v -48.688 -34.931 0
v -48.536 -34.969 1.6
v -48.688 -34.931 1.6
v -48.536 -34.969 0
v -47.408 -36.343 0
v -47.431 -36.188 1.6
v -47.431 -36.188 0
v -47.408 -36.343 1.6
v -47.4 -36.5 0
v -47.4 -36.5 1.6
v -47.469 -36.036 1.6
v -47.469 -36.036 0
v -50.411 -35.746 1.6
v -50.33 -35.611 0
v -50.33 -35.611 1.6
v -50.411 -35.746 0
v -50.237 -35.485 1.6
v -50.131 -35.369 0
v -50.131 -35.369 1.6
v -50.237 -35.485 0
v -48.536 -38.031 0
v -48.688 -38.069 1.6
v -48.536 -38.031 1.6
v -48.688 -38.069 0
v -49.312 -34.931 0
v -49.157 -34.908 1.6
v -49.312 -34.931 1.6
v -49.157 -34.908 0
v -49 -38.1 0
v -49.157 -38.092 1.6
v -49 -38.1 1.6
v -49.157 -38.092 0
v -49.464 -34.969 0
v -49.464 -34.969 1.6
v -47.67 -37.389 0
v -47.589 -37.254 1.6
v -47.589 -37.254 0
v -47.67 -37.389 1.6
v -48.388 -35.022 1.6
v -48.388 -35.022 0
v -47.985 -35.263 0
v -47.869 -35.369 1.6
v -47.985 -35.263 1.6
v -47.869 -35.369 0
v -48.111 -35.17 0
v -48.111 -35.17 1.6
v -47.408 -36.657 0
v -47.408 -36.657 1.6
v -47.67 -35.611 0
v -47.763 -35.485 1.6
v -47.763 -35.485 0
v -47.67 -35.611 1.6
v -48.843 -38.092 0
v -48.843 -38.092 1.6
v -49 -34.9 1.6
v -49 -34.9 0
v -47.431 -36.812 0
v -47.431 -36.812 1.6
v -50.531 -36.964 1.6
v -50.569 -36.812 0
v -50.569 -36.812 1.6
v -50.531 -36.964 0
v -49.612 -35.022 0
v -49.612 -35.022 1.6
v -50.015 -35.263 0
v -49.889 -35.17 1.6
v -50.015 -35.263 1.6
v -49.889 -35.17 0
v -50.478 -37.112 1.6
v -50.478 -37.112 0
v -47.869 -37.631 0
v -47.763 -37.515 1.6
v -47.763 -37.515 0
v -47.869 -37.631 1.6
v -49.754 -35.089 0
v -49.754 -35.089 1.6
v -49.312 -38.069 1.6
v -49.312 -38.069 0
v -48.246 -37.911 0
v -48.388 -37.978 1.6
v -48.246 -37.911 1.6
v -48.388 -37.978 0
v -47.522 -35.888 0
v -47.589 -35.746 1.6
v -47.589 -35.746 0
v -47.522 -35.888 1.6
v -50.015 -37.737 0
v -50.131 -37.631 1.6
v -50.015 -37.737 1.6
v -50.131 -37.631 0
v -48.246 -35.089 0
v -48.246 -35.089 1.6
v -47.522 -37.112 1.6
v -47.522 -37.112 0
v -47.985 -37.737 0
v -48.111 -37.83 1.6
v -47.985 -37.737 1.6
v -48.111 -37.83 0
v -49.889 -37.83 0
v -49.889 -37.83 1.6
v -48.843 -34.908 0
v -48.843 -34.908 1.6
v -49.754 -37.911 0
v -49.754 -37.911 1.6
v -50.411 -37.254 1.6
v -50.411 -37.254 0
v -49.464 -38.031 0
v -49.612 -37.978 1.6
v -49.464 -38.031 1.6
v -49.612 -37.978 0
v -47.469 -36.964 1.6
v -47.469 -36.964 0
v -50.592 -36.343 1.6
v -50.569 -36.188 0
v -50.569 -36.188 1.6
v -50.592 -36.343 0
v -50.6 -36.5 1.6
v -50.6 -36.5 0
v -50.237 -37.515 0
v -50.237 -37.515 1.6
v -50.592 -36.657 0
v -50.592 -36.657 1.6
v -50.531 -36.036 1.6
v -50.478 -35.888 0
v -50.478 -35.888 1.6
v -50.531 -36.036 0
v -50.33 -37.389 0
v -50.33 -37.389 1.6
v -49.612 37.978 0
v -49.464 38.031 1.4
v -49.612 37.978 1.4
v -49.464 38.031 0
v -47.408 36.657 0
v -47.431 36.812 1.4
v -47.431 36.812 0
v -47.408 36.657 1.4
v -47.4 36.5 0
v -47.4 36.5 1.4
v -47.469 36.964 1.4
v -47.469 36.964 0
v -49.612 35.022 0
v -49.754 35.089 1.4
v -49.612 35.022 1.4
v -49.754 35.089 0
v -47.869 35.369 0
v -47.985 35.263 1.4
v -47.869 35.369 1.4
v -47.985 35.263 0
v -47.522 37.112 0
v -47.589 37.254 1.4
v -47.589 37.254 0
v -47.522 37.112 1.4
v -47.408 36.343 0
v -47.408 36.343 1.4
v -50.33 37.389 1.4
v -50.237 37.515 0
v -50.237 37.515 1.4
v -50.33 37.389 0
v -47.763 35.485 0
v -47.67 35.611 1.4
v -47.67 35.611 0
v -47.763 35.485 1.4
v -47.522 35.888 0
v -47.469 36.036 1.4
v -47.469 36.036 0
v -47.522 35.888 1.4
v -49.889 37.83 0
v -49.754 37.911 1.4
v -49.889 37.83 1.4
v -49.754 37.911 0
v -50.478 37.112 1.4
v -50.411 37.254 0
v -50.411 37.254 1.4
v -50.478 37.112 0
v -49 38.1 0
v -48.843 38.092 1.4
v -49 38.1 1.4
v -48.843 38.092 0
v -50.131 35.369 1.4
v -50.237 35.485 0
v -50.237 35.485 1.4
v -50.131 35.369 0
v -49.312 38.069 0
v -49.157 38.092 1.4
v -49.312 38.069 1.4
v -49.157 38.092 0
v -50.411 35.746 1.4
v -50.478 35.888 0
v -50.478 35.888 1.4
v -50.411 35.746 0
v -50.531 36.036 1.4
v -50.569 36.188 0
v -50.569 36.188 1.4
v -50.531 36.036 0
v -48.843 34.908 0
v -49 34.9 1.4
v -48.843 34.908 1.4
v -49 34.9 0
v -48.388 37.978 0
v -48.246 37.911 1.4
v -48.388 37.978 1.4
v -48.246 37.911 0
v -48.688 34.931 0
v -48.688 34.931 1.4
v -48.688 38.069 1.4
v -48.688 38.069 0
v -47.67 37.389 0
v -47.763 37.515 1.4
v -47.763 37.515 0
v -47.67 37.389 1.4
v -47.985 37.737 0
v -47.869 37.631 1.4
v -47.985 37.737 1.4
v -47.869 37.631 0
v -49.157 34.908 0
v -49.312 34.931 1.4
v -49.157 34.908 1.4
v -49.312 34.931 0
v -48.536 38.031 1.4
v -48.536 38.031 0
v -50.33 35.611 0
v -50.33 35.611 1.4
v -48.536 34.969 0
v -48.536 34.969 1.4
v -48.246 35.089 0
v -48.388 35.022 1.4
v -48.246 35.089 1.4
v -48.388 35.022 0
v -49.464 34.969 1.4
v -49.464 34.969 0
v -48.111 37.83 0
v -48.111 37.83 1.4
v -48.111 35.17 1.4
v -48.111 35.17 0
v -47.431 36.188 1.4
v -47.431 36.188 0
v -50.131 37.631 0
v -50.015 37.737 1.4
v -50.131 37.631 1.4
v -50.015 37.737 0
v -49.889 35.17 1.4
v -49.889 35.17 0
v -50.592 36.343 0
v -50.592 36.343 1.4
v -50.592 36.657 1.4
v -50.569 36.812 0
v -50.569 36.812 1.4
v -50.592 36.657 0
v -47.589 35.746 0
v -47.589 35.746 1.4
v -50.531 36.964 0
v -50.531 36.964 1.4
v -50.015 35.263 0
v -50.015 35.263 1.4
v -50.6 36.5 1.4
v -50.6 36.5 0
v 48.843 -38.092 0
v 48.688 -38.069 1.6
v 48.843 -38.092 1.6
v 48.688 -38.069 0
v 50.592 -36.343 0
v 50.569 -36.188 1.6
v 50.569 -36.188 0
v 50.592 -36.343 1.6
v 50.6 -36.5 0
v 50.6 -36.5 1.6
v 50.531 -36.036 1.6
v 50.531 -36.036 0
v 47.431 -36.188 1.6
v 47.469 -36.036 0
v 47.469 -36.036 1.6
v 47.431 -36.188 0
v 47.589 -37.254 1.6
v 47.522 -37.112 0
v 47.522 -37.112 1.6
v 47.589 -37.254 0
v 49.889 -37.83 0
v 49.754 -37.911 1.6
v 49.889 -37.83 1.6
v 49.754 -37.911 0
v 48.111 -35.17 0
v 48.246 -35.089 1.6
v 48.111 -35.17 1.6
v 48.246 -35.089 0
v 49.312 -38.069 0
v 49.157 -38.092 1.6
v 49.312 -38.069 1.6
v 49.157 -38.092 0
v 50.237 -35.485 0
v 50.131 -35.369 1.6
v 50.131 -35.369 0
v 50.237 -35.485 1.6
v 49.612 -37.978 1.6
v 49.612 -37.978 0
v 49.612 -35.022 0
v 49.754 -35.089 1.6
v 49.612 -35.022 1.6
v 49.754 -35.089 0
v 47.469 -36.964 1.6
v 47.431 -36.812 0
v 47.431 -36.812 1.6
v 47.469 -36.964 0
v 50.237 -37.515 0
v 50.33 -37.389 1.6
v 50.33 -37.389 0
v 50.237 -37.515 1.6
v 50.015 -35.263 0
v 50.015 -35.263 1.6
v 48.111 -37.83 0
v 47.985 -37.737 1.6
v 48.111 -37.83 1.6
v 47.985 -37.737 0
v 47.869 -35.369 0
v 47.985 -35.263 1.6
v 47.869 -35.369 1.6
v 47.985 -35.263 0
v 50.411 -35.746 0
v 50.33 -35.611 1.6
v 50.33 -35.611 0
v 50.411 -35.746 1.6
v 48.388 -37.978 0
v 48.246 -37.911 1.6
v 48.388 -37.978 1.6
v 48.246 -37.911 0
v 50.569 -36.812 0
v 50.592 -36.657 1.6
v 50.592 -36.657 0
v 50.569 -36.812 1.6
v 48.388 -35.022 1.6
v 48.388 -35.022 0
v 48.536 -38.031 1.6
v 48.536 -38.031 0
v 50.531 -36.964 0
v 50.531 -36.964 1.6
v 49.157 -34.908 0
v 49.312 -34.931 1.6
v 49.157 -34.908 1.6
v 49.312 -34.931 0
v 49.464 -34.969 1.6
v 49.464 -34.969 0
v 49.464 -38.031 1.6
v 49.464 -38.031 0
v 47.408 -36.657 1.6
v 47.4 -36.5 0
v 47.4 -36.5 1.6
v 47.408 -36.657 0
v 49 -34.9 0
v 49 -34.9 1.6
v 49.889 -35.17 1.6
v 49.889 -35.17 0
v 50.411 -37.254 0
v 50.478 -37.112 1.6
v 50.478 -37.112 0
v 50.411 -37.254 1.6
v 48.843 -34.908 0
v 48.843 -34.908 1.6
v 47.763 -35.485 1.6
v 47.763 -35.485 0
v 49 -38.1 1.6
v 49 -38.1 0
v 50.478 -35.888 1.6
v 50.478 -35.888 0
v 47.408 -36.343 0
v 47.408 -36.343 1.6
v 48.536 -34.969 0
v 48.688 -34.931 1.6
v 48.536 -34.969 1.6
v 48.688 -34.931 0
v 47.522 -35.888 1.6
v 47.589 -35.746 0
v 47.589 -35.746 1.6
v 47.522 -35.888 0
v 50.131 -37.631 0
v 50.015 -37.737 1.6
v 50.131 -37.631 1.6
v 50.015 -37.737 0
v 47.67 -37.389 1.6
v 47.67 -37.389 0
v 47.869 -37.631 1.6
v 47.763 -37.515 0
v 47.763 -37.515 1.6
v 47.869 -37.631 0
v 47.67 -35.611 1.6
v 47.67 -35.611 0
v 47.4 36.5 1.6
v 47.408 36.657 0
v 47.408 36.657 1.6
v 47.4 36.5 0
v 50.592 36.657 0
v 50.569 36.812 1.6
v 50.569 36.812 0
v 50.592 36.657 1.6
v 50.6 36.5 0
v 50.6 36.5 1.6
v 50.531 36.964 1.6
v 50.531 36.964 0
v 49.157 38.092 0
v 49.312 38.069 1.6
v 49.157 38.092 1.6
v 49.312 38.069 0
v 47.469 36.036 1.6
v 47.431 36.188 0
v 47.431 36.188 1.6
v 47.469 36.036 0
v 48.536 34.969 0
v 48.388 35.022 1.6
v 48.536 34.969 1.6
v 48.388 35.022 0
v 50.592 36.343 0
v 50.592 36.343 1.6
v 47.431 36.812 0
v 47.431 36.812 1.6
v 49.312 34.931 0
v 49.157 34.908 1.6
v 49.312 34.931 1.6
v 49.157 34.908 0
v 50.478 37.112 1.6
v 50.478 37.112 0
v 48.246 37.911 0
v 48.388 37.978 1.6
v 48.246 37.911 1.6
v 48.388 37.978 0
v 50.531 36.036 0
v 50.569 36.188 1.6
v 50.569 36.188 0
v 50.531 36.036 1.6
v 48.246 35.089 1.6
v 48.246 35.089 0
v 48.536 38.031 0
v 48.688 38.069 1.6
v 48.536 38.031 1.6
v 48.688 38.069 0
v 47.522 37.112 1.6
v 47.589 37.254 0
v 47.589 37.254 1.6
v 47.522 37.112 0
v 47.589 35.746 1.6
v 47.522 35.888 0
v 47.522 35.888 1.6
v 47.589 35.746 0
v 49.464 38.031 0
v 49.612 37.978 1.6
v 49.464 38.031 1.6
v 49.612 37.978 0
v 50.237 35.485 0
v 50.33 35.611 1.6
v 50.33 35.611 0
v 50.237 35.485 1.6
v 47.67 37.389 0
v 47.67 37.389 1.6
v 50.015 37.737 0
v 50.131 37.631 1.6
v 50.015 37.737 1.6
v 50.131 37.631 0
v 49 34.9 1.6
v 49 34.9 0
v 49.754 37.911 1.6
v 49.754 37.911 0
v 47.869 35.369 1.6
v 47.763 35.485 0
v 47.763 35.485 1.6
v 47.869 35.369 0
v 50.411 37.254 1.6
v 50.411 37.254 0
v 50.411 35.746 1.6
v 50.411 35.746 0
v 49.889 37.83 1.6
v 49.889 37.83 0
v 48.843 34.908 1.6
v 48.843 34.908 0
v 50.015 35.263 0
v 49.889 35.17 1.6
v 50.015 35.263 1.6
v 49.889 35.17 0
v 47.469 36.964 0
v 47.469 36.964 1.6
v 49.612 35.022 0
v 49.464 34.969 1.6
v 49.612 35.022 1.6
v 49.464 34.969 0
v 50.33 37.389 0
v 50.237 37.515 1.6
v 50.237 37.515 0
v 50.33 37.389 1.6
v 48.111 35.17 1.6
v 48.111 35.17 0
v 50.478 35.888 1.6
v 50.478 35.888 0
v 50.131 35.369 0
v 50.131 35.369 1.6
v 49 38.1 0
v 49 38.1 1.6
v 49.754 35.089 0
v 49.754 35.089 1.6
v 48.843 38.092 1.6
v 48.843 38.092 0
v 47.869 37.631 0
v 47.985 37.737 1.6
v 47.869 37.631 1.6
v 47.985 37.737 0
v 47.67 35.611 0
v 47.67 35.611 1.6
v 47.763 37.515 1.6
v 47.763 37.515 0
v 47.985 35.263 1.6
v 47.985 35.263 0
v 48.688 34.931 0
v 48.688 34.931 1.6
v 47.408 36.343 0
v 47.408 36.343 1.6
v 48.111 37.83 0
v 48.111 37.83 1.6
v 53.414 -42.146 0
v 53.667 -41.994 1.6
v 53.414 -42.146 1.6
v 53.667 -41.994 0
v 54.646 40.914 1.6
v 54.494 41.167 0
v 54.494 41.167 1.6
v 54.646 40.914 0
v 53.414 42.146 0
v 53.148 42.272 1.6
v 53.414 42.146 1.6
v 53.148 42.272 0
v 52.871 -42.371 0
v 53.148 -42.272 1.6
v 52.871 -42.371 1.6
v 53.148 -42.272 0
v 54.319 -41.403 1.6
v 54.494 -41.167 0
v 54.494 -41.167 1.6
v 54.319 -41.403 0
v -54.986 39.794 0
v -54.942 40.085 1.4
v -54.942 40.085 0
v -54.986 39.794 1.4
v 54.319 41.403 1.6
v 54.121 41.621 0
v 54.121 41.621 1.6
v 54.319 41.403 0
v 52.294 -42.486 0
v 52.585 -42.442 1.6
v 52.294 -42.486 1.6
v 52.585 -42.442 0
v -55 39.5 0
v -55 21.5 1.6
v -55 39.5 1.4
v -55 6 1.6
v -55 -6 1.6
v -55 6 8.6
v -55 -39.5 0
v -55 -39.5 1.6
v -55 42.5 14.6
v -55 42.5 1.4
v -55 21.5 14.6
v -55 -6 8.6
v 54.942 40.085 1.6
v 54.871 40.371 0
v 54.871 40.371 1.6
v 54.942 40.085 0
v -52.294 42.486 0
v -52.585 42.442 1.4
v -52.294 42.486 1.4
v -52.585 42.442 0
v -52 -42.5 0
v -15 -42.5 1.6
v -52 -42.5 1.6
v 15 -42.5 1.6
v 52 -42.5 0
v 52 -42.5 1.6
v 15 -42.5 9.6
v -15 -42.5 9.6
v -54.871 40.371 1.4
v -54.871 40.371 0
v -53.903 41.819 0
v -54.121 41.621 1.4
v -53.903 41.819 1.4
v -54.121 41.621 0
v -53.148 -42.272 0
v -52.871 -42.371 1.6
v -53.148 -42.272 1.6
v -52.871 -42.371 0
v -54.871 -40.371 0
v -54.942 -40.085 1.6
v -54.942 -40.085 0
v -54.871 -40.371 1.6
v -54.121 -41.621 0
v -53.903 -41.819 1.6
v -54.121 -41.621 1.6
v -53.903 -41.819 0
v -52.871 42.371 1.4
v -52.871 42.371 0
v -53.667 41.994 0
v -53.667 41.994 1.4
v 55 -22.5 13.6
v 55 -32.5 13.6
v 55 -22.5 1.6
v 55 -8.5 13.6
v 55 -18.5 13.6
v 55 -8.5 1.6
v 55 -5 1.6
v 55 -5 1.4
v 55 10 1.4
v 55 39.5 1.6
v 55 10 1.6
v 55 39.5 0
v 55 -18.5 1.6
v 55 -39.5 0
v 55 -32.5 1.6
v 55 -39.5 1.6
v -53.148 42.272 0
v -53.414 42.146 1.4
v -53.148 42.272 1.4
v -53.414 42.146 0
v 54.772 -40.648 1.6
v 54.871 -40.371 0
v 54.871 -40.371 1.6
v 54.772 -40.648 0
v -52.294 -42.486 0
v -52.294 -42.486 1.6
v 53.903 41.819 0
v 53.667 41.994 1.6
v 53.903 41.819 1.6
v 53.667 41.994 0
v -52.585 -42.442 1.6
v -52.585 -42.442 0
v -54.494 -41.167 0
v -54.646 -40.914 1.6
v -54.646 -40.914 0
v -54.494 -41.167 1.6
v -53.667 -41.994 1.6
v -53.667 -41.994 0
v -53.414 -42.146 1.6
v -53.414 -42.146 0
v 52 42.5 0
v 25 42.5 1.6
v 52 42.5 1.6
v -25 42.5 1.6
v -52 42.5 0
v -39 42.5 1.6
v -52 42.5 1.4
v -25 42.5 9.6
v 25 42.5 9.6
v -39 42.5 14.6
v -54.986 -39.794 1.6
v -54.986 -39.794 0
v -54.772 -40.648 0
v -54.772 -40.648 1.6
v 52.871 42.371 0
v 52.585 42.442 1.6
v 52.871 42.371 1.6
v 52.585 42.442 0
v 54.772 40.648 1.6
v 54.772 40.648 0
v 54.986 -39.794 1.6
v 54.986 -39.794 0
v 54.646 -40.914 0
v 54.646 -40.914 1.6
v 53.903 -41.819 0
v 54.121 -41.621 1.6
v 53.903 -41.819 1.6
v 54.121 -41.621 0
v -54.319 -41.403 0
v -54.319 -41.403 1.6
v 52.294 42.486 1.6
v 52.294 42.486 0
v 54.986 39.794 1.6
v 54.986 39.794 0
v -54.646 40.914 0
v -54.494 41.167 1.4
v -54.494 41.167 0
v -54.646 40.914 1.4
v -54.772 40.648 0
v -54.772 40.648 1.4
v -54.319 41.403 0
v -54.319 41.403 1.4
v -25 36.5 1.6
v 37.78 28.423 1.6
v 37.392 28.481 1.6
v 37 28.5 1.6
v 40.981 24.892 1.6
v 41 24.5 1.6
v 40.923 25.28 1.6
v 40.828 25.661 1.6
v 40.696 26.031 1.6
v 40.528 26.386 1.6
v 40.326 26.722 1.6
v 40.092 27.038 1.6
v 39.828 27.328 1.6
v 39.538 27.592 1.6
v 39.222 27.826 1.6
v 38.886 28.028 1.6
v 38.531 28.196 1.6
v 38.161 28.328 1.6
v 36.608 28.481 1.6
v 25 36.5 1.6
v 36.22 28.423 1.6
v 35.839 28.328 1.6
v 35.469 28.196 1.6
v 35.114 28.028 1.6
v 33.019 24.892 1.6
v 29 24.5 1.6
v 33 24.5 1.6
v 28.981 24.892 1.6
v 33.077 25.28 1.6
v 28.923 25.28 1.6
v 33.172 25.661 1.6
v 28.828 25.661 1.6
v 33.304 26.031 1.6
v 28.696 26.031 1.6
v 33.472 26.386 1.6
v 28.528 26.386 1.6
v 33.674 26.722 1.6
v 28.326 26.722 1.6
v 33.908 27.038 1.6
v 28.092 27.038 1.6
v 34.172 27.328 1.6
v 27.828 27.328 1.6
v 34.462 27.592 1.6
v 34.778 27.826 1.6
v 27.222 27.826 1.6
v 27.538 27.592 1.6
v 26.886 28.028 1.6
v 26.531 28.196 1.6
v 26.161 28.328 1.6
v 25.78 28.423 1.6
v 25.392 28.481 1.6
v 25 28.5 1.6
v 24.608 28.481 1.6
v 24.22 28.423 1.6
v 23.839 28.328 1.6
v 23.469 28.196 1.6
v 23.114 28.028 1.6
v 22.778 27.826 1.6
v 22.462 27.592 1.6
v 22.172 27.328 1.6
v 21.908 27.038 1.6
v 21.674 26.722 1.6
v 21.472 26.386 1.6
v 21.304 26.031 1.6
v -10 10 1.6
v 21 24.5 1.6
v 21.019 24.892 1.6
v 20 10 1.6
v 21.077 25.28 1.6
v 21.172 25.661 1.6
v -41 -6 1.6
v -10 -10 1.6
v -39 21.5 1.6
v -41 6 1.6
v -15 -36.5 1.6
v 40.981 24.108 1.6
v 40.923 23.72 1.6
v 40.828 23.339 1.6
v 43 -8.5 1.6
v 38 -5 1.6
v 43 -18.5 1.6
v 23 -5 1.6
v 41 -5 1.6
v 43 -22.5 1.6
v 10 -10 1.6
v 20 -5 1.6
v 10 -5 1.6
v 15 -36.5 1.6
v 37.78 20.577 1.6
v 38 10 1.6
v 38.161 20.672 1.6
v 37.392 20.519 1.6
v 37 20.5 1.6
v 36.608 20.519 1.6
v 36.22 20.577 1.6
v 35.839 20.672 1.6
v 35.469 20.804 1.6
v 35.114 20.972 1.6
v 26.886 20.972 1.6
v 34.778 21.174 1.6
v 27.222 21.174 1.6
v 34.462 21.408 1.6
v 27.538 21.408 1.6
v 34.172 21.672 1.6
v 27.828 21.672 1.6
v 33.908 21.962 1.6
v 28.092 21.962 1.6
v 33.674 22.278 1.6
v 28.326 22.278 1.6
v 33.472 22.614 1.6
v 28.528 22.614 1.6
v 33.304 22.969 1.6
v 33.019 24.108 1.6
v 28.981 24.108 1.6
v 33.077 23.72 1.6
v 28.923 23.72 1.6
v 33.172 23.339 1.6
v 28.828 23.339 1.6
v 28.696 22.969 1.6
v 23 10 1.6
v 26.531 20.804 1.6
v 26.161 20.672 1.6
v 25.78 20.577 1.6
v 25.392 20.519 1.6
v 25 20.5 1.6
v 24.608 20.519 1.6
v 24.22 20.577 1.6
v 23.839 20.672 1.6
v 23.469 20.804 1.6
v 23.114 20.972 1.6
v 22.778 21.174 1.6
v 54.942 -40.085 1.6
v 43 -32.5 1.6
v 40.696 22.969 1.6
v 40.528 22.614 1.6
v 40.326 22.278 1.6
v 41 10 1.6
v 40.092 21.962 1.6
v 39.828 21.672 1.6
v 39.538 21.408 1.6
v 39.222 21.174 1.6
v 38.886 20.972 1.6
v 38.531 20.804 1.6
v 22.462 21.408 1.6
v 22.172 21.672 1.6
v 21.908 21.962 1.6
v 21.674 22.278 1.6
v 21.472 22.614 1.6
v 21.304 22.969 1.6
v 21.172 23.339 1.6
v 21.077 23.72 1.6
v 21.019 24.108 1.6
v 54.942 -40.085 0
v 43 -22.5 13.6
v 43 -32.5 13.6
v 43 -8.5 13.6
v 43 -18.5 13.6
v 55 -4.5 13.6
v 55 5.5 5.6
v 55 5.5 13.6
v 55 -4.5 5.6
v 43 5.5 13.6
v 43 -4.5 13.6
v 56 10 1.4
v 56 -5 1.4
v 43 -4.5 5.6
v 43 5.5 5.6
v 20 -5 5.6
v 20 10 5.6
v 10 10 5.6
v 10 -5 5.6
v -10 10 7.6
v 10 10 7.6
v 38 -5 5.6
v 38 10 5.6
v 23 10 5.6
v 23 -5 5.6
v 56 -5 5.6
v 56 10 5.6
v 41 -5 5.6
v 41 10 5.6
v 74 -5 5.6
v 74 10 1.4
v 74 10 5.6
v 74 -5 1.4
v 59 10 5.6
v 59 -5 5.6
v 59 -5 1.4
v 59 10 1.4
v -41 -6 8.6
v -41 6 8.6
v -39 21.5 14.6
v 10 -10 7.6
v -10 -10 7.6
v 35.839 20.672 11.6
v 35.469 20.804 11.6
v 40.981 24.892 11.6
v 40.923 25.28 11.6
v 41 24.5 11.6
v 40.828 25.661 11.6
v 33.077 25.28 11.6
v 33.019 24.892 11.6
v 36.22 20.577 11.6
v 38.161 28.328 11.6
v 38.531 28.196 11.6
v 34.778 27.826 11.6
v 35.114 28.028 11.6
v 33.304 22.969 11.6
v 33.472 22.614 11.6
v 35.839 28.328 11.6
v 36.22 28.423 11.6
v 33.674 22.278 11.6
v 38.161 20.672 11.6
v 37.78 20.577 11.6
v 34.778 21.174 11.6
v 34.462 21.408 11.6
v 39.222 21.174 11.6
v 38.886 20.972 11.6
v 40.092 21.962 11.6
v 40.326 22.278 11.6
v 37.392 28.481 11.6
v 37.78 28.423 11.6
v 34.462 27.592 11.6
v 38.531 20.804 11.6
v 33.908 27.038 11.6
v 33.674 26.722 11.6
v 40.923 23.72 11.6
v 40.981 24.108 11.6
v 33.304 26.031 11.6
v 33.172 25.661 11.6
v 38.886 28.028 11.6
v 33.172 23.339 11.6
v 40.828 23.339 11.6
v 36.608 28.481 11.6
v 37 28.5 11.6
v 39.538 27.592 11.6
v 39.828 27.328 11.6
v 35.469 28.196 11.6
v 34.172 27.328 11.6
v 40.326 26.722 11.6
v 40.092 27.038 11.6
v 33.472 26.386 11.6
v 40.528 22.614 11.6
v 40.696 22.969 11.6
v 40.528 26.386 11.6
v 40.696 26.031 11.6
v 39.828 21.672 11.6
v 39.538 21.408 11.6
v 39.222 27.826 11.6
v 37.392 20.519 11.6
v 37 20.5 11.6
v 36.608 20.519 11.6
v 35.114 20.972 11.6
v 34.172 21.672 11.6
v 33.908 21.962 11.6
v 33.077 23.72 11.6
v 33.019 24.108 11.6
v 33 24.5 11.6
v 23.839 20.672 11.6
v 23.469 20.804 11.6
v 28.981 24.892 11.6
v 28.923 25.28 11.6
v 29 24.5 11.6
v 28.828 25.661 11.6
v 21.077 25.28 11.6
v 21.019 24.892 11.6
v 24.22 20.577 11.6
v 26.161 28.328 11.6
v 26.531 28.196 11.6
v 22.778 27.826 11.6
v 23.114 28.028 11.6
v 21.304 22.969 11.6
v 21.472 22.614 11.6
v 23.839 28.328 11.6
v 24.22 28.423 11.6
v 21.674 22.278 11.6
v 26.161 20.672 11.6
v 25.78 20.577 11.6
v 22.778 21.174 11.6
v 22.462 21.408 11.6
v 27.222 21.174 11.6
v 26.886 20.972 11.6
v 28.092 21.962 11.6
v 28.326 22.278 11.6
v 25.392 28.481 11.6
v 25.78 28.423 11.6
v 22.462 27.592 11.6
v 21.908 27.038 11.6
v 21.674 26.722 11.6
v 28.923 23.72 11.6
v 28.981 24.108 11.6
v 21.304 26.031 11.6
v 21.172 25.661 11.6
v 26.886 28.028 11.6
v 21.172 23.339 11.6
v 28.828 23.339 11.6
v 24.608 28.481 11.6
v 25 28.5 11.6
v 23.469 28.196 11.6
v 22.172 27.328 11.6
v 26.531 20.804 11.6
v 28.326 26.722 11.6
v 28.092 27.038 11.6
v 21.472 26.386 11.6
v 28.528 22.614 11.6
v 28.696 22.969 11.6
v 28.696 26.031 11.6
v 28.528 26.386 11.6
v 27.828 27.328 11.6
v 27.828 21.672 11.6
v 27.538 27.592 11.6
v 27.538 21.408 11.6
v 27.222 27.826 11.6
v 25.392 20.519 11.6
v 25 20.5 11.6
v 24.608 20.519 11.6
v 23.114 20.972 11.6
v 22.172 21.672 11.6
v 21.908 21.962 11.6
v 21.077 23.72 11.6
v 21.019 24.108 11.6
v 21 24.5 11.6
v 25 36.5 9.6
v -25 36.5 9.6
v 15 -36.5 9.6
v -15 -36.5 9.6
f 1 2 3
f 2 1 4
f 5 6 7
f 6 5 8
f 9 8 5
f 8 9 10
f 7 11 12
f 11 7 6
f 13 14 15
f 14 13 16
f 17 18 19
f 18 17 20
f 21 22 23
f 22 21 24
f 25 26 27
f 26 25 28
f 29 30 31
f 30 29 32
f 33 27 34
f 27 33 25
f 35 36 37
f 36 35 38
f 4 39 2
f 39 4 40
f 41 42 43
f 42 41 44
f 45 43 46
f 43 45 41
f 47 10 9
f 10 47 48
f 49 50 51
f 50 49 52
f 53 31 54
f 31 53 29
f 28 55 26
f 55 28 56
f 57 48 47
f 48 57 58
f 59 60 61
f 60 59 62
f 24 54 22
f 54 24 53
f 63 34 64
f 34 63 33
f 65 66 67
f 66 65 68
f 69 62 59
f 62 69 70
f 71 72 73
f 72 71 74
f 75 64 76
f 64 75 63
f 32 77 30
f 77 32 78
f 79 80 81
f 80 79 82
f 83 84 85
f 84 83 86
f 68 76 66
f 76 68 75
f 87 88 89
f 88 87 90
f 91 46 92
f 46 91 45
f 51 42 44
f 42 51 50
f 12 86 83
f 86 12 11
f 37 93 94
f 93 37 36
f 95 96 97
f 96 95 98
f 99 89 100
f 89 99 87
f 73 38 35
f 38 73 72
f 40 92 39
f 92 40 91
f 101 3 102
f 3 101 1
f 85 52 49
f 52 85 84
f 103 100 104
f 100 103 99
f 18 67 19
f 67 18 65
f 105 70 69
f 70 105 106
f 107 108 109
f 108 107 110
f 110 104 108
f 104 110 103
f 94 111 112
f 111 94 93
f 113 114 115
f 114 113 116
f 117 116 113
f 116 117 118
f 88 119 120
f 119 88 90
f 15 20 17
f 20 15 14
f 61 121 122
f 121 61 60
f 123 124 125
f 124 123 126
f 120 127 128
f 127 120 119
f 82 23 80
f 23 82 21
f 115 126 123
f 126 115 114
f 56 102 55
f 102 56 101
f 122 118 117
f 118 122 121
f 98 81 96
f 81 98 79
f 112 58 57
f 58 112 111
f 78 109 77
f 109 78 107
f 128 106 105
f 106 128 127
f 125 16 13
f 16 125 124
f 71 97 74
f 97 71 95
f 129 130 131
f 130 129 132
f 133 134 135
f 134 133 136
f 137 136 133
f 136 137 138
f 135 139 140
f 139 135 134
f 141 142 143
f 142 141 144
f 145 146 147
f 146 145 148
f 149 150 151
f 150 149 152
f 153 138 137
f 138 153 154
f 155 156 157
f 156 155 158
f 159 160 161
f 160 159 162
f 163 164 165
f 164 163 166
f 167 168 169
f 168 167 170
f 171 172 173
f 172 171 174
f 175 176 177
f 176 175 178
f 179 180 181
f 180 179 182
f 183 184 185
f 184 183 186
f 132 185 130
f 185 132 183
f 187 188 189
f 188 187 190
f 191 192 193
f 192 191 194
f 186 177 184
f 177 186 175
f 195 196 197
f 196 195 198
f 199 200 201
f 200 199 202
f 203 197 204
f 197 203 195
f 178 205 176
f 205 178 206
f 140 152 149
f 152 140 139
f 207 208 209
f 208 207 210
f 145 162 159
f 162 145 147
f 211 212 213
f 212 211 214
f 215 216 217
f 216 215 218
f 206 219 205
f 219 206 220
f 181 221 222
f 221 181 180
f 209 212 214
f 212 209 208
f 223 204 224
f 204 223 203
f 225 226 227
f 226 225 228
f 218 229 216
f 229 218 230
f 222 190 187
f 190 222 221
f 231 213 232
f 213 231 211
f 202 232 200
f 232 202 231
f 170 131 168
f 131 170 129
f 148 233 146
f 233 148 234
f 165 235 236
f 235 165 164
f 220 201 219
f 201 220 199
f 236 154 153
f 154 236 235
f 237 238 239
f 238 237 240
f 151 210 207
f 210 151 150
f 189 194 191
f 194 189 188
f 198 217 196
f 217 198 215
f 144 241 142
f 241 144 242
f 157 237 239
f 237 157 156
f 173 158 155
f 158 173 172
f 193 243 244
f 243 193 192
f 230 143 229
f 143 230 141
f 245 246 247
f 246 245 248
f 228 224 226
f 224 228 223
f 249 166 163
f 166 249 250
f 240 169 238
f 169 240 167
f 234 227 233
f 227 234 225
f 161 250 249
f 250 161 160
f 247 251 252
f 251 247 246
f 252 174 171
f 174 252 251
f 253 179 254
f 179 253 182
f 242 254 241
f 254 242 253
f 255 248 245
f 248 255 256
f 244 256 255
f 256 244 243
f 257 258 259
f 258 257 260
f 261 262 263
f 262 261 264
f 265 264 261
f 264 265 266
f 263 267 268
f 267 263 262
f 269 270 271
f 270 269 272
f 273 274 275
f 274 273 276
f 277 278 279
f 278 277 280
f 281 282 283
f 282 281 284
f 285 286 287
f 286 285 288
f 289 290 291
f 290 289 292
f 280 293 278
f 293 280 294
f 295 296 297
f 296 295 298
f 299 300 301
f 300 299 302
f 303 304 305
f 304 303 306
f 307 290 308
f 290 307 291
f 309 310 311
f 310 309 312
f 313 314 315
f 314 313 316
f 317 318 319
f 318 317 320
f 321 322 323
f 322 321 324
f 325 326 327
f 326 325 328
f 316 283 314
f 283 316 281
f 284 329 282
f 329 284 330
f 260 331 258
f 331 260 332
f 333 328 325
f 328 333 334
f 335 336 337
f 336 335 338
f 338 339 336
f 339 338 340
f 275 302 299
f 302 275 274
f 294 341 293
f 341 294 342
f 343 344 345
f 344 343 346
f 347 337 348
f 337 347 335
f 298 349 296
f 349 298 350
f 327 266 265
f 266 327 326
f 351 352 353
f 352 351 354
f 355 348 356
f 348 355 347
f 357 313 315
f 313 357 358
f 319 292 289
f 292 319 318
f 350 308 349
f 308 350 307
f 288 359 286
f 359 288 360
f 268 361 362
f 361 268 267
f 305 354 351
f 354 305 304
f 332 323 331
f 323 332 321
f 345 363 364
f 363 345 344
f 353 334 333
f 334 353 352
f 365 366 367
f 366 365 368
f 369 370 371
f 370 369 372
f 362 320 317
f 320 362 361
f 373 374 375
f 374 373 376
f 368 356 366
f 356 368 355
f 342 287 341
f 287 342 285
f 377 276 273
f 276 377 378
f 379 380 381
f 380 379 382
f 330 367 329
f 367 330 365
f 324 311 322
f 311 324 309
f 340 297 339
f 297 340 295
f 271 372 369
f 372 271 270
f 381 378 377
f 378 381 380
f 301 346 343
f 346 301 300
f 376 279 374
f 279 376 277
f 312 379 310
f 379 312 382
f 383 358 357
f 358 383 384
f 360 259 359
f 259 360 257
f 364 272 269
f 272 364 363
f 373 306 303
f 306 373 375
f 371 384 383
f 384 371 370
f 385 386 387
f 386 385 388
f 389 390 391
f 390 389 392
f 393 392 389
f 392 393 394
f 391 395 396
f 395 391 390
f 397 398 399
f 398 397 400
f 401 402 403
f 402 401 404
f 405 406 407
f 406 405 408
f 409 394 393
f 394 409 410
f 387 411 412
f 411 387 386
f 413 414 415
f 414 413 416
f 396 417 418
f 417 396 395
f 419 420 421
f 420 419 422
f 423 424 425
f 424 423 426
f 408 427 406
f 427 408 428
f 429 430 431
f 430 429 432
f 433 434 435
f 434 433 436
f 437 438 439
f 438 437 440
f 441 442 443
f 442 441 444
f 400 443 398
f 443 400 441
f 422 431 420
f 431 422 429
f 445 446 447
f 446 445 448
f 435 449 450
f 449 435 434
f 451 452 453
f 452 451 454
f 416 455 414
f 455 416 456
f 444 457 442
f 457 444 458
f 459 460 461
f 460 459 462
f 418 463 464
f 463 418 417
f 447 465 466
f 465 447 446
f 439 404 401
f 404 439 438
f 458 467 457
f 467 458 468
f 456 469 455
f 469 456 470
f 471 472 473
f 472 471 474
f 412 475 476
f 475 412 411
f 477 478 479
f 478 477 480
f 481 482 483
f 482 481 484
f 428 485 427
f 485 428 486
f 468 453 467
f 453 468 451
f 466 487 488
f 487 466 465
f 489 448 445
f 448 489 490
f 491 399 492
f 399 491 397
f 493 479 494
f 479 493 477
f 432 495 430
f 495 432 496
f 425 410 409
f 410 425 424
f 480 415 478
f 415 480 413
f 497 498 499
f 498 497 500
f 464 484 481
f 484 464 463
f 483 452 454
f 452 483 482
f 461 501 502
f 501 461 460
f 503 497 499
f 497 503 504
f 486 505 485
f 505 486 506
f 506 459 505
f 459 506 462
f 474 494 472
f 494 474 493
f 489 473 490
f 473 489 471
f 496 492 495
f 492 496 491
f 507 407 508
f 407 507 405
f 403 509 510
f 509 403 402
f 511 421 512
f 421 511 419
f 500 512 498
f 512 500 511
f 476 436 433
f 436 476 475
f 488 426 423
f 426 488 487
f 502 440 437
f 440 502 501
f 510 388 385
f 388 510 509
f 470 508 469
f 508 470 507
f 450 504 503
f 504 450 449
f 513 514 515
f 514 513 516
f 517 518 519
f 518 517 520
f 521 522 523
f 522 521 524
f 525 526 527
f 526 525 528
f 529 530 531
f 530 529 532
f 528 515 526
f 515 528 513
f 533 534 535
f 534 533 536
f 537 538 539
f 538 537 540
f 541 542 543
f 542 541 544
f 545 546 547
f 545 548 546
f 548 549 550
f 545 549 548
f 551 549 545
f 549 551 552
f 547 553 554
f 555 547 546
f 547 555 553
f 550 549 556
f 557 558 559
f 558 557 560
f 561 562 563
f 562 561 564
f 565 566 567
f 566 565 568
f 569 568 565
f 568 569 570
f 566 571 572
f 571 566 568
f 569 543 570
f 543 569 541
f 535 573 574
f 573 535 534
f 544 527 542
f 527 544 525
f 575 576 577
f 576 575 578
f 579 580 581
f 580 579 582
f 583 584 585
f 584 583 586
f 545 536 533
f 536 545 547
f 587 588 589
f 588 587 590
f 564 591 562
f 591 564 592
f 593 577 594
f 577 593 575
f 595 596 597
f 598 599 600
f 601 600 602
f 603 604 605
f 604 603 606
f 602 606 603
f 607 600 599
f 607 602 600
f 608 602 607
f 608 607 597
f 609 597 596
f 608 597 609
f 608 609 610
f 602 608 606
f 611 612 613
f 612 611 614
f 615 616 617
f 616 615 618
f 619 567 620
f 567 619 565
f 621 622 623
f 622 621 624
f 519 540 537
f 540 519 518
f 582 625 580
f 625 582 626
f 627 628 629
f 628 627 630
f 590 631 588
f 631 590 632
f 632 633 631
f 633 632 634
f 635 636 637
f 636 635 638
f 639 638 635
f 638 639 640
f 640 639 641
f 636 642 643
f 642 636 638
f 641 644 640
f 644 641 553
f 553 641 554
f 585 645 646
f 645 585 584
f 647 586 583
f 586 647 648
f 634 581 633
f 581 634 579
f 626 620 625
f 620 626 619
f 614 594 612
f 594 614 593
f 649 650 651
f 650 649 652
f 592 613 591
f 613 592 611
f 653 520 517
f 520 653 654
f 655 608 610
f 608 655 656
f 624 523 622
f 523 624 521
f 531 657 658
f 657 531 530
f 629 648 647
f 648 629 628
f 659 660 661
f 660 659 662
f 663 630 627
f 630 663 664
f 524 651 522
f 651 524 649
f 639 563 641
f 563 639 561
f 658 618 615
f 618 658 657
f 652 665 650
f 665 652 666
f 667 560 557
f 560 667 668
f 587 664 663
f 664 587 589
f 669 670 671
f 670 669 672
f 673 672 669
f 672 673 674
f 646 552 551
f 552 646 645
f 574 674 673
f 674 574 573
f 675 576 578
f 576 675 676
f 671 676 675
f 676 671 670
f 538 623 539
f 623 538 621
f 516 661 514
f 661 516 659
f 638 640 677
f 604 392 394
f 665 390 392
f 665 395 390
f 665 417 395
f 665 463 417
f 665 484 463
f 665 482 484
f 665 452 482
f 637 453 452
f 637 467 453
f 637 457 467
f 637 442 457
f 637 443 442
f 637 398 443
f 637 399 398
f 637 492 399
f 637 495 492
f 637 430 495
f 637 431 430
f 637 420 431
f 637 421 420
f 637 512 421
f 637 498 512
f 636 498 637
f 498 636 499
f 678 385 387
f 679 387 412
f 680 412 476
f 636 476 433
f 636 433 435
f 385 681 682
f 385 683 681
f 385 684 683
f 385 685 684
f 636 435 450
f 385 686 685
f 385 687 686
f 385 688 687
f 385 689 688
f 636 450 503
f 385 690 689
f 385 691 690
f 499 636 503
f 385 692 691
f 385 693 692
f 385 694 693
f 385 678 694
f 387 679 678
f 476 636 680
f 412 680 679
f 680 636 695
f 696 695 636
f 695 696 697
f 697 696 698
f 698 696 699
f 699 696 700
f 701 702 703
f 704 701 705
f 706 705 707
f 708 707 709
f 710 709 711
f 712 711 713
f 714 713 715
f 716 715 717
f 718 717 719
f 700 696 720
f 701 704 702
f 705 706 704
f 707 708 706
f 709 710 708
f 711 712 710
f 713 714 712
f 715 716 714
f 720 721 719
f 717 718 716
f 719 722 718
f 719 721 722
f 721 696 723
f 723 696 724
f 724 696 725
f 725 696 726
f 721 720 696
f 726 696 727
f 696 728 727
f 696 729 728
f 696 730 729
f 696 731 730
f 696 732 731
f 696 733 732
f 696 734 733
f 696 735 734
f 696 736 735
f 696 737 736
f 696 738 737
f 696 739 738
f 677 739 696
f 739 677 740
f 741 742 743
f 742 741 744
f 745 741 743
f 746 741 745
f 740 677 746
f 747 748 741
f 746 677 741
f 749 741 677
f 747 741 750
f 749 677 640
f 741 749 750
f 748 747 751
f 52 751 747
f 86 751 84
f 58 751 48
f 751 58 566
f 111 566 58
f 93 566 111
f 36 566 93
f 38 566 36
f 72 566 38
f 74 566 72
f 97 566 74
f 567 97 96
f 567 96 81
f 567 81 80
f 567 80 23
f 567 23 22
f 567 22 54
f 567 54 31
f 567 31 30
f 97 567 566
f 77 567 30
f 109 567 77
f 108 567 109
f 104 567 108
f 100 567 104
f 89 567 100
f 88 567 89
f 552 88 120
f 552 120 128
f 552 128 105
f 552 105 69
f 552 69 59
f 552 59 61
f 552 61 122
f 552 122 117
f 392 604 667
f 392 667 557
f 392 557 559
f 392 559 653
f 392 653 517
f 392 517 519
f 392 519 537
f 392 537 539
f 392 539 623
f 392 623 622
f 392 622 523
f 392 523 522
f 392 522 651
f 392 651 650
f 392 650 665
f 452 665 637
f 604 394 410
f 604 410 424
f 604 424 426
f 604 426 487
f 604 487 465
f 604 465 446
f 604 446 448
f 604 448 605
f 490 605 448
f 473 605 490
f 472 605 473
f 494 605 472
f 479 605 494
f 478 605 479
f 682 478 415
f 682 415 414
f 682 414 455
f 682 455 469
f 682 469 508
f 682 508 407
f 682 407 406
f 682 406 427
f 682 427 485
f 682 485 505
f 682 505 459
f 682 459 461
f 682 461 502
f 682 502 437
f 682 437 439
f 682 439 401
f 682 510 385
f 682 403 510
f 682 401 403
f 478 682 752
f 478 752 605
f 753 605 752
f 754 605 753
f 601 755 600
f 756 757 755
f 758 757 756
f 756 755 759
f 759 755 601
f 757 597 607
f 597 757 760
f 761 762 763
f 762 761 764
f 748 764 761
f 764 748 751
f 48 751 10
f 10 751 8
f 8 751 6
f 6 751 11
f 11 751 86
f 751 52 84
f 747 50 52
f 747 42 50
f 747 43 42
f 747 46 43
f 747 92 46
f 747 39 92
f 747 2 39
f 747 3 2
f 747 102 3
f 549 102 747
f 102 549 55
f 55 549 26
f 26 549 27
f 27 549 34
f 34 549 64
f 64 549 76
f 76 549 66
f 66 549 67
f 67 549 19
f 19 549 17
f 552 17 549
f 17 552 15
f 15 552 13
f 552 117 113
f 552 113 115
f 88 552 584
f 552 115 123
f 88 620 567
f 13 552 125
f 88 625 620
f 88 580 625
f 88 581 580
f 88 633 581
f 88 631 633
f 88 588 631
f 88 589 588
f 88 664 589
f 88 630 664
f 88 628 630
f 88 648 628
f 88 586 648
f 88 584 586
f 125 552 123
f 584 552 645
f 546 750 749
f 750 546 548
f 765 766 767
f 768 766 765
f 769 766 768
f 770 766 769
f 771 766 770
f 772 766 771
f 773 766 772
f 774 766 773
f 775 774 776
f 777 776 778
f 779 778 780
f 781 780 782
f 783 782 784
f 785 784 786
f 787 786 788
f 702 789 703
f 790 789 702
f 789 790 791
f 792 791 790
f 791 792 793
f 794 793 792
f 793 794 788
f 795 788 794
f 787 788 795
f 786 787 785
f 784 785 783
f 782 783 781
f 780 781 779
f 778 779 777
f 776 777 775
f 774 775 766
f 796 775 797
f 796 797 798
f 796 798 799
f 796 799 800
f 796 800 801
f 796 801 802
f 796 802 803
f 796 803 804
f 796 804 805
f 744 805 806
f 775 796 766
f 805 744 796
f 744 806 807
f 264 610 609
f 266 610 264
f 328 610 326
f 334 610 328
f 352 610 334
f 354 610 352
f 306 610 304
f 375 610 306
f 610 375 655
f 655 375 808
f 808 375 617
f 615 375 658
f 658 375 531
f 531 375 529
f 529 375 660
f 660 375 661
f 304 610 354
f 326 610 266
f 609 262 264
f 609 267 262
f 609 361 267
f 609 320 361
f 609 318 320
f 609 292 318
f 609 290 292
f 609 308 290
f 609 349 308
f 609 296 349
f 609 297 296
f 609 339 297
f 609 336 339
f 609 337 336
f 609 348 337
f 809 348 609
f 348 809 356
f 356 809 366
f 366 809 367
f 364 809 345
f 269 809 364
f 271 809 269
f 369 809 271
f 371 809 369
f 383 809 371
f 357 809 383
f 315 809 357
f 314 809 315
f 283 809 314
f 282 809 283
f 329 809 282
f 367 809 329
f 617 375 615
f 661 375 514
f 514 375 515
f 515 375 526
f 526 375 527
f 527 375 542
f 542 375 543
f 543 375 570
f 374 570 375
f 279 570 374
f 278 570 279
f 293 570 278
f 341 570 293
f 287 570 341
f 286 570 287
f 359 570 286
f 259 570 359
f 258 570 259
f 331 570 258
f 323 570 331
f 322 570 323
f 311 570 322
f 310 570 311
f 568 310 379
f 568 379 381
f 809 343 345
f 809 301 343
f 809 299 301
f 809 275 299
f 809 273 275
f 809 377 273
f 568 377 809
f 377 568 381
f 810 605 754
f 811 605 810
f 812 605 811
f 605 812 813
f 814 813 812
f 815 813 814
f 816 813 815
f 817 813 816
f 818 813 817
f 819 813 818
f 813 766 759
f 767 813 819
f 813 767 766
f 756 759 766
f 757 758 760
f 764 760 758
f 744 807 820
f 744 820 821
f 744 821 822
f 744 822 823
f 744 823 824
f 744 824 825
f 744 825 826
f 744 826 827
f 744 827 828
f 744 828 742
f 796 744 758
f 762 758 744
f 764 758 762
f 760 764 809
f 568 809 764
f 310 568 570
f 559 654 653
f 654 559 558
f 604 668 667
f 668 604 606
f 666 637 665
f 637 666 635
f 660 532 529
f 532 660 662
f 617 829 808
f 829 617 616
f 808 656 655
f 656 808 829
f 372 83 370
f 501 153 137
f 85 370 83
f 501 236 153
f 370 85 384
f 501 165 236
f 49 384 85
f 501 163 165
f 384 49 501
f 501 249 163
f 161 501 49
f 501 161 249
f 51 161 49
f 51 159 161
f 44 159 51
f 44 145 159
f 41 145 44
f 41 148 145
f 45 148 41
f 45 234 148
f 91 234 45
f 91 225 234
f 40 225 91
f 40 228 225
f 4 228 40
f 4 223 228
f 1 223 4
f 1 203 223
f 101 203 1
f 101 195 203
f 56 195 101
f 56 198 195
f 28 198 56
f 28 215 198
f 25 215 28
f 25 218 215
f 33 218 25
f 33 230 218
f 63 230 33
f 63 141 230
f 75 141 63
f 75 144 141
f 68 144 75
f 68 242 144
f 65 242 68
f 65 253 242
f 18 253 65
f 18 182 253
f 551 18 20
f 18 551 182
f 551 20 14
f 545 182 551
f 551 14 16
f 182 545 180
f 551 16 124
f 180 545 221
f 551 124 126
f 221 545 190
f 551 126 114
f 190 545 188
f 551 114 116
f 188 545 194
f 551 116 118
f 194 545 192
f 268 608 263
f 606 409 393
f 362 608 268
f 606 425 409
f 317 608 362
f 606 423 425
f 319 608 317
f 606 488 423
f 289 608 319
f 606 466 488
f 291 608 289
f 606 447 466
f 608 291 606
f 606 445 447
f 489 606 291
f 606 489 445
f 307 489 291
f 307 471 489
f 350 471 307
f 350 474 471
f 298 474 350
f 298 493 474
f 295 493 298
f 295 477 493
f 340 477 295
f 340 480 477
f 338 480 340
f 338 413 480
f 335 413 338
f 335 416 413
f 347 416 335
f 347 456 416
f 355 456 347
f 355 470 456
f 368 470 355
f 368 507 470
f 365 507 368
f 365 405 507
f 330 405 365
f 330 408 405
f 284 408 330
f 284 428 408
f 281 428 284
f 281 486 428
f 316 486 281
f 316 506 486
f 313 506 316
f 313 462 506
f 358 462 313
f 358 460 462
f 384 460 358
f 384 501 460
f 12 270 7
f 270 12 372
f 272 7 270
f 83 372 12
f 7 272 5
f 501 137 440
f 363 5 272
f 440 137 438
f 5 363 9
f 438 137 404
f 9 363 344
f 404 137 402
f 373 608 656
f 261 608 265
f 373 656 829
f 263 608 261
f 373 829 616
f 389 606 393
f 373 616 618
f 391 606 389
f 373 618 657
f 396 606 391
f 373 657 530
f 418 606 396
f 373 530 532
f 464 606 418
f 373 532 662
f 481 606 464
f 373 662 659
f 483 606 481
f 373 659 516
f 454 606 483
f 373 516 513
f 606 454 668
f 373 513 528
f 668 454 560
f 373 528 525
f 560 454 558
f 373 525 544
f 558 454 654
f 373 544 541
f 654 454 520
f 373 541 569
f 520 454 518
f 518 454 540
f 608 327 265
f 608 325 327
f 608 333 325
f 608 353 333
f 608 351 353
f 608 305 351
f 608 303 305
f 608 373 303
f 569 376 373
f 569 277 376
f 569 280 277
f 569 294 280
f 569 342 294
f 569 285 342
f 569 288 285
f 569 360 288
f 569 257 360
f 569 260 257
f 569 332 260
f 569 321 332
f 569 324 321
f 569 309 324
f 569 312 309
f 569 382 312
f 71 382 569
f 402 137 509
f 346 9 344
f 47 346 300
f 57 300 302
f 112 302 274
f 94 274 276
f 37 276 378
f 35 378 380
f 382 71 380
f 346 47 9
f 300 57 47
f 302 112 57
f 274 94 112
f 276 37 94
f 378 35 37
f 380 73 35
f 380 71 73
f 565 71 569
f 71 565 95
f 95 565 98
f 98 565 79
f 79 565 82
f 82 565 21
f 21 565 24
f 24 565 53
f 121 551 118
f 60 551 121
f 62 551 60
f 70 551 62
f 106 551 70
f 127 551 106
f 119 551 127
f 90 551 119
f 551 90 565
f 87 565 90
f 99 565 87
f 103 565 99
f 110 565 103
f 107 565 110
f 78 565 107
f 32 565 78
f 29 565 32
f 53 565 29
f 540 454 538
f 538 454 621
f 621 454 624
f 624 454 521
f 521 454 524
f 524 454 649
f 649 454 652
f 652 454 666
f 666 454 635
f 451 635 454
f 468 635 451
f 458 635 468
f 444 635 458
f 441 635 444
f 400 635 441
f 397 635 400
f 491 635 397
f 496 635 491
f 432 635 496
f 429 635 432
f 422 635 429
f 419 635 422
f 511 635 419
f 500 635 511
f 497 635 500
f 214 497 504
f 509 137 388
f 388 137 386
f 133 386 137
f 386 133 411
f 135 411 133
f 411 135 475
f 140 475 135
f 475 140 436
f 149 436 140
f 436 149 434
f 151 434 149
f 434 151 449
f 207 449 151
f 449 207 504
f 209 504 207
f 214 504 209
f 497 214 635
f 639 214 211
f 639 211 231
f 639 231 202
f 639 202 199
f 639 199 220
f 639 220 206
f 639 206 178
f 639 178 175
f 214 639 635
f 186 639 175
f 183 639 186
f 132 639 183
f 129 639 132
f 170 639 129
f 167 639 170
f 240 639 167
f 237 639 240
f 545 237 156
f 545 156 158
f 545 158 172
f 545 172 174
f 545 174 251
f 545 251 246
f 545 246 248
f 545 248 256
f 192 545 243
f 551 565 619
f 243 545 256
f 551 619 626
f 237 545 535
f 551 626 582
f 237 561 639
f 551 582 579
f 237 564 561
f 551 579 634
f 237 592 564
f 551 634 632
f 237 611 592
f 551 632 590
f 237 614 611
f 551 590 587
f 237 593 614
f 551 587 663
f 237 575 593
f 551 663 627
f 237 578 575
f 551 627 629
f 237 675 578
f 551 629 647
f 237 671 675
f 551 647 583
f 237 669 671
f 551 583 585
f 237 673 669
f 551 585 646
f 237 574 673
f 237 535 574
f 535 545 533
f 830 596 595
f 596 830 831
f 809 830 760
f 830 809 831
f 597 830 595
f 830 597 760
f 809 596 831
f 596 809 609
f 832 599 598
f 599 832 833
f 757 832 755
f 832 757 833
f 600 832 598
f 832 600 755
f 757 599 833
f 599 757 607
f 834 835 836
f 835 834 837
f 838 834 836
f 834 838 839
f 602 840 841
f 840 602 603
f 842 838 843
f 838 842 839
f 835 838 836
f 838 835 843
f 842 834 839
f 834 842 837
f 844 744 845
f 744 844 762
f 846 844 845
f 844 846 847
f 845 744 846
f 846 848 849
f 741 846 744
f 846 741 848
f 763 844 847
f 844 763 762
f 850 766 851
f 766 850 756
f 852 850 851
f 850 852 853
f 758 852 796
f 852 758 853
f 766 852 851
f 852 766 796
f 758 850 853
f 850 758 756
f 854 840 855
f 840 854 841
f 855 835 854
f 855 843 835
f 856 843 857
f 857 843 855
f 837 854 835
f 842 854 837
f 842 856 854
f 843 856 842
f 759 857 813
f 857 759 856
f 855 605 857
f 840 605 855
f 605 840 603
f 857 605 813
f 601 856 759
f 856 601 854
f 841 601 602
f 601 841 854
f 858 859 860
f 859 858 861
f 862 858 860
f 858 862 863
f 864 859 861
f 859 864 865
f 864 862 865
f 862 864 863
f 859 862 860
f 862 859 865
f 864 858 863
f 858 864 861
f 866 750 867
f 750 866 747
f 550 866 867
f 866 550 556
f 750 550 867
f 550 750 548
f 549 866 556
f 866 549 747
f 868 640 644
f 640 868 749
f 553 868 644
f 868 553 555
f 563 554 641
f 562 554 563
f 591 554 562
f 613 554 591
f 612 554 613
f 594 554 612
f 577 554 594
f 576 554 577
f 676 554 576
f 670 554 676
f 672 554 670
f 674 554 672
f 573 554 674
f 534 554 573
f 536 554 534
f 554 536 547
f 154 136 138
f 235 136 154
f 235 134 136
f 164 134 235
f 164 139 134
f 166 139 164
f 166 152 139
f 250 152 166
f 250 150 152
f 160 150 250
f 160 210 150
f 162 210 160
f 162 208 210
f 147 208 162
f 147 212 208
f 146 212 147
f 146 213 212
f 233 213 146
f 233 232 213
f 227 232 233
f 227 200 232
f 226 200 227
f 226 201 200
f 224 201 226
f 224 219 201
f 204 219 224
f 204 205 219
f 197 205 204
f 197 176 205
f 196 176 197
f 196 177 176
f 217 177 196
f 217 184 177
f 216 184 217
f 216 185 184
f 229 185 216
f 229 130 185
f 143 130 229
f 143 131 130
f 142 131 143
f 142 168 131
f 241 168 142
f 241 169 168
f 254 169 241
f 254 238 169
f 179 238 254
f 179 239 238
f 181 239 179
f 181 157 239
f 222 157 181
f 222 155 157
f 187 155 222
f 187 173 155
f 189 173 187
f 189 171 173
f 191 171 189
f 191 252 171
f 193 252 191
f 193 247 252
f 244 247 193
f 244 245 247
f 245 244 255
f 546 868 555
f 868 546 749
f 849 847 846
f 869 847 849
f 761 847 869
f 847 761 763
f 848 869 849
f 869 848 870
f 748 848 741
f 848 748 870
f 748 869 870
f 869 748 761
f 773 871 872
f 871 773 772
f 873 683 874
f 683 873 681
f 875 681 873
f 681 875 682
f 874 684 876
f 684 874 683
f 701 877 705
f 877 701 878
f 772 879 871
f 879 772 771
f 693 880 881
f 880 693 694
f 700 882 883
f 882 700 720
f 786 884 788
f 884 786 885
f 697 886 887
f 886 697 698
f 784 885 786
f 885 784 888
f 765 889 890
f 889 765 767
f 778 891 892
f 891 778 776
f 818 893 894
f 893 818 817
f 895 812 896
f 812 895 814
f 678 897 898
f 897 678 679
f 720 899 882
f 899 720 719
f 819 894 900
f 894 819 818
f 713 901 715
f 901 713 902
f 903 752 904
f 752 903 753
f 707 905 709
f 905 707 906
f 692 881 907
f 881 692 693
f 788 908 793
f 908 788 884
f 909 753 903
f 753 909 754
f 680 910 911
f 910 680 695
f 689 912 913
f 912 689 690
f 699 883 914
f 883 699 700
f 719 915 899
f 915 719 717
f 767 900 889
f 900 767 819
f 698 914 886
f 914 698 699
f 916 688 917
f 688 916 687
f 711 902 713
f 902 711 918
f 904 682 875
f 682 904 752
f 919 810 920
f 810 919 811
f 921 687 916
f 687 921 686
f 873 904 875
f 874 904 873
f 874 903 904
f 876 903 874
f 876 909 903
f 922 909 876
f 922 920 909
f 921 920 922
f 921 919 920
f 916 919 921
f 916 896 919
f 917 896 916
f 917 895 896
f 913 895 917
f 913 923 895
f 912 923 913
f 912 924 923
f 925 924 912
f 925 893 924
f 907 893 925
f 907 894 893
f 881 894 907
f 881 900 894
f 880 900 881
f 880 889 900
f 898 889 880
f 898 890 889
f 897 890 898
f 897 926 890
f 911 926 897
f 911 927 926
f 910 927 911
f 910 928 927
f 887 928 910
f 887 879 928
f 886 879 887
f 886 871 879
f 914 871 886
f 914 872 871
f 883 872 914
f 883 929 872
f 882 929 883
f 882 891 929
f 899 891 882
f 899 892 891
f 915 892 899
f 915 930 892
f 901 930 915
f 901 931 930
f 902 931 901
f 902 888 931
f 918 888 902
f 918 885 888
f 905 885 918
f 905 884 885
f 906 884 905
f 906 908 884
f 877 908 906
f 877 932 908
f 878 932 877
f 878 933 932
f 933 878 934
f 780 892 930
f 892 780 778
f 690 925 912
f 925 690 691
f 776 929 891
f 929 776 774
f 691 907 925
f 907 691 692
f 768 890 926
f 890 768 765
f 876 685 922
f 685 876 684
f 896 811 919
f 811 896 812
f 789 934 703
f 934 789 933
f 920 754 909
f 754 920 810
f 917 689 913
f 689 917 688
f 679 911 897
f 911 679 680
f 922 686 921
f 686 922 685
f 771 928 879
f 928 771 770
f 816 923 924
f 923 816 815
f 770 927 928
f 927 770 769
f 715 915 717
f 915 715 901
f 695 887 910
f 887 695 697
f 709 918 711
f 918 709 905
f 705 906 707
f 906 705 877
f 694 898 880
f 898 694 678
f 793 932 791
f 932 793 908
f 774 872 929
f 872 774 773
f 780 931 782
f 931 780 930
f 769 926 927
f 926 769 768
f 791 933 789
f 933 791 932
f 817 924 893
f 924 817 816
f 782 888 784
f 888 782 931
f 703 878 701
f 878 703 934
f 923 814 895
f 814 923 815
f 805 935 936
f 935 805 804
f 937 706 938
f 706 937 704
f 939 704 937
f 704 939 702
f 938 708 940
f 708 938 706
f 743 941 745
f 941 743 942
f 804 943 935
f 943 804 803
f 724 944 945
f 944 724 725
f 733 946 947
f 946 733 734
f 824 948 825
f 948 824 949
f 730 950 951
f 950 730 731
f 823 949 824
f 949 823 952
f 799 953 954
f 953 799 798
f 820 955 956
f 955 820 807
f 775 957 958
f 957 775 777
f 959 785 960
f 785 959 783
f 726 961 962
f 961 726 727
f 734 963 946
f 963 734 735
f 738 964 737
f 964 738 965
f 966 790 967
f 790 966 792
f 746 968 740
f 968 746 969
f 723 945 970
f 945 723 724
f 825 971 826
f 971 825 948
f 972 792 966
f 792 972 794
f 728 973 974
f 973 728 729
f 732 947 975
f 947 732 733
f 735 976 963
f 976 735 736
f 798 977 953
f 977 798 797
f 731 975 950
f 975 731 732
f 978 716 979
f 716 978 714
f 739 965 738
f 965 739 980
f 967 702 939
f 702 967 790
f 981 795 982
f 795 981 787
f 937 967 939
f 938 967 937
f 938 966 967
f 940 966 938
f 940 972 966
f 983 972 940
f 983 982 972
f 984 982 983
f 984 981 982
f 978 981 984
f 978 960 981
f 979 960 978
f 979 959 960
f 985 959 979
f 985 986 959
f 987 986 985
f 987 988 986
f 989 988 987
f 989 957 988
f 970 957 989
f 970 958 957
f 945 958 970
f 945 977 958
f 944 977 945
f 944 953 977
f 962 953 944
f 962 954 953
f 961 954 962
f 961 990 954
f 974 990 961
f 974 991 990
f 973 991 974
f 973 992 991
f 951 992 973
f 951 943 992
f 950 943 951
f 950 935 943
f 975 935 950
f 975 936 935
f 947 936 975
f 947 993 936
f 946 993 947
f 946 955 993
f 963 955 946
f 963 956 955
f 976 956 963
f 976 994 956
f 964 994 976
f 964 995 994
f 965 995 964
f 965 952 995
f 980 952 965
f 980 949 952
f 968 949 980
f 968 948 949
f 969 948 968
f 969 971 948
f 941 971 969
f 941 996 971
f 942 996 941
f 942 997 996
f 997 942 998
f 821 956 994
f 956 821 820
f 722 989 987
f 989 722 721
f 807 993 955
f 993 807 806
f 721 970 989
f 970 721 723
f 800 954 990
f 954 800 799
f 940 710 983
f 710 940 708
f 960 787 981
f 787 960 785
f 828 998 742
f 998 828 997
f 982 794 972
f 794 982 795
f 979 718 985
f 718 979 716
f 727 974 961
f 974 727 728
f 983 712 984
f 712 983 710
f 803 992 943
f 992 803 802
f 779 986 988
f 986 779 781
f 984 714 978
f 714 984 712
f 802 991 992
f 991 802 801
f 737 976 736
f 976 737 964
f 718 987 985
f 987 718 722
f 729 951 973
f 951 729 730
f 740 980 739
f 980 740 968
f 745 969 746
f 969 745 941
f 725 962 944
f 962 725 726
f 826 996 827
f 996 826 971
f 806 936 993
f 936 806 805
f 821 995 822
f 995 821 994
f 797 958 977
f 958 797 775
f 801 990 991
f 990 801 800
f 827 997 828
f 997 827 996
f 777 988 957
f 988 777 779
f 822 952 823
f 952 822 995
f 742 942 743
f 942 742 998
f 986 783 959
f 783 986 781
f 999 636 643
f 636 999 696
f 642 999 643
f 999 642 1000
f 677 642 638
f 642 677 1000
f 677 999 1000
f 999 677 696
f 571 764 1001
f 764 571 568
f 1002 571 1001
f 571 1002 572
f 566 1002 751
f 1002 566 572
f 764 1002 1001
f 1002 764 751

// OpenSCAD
$fn = 64;

// Mainboard overall size (verified)
board_x = 110.0;
board_y = 85.0;
board_th = 1.6;

// Small overlap to guarantee watertight unions
ov = 0.2;

// --- Feature sizes (approximate mainboard details) ---
corner_r = 3.0;

// Mounting holes (typical 3D printer controller boards)
hole_d = 3.2;
hole_edge_x = 6.0;
hole_edge_y = 6.0;

// Components (kept within board outline)
usb_w = 14.0;   usb_d = 12.0;  usb_h = 7.0;
eth_w = 16.0;   eth_d = 21.0;  eth_h = 13.0;

term_w = 12.0;  term_d = 10.0; term_h = 12.0; // screw terminal blocks
step_w = 15.0;  step_d = 15.0; step_h = 4.0;  // stepper driver modules
cap_r = 4.0;    cap_h = 10.0;                 // electrolytic caps
ic_w = 18.0;    ic_d = 18.0;  ic_h = 2.0;     // main MCU/IC
heats_w = 20.0; heats_d = 20.0; heats_h = 6.0;

header_w = 50.0; header_d = 6.0; header_h = 8.0; // pin header strip

module rounded_board(x, y, th, r) {
    linear_extrude(height=th)
        offset(r=r)
            square([x-2*r, y-2*r], center=true);
}

module mount_holes() {
    for (sx = [-1, 1], sy = [-1, 1]) {
        translate([sx*(board_x/2 - hole_edge_x), sy*(board_y/2 - hole_edge_y), -ov])
            cylinder(d=hole_d, h=board_th + 2*ov, center=false);
    }
}

module component_box(w, d, h, x, y) {
    // Sits on top of PCB and slightly overlaps into it for a single connected solid
    translate([x, y, board_th - ov])
        cube([w, d, h + ov], center=false);
}

module component_cyl(r, h, x, y) {
    translate([x, y, board_th - ov])
        cylinder(r=r, h=h + ov, center=false);
}

color([0.05, 0.45, 0.15])
union() {
    // PCB with mounting holes
    difference() {
        rounded_board(board_x, board_y, board_th, corner_r);
        mount_holes();
    }

    // Edge connectors (placed flush to edges using formulas)
    // USB (left edge)
    component_box(
        usb_w, usb_d, usb_h,
        -board_x/2,                       // flush to left edge
        -usb_d/2                          // slightly toward bottom half
    );

    // Ethernet (left edge, above USB)
    component_box(
        eth_w, eth_d, eth_h,
        -board_x/2,                       // flush to left edge
        board_y/2 - eth_d                 // near top edge
    );

    // Screw terminals (right edge, three blocks)
    for (i = [0:2]) {
        component_box(
            term_w, term_d, term_h,
            board_x/2 - term_w,           // flush to right edge
            -board_y/2 + 10 + i*(term_d + 4)
        );
    }

    // Stepper driver modules (center-right area, 4 modules)
    for (i = [0:3]) {
        component_box(
            step_w, step_d, step_h,
            5 + i*(step_w + 3),
            -5
        );
    }

    // Main IC + heatsink (center)
    component_box(
        ic_w, ic_d, ic_h,
        -ic_w/2,
        -ic_d/2
    );
    component_box(
        heats_w, heats_d, heats_h,
        -heats_w/2,
        -heats_d/2
    );

    // Capacitors (top-right quadrant)
    component_cyl(
        cap_r, cap_h,
        board_x/2 - 18,
        board_y/2 - 18
    );
    component_cyl(
        cap_r, cap_h,
        board_x/2 - 30,
        board_y/2 - 18
    );

    // Long header strip (top edge)
    component_box(
        header_w, header_d, header_h,
        -header_w/2,
        board_y/2 - header_d
    );

    // Small header strip (bottom edge)
    component_box(
        header_w*0.6, header_d, header_h,
        -header_w*0.3,
        -board_y/2
    );
}
